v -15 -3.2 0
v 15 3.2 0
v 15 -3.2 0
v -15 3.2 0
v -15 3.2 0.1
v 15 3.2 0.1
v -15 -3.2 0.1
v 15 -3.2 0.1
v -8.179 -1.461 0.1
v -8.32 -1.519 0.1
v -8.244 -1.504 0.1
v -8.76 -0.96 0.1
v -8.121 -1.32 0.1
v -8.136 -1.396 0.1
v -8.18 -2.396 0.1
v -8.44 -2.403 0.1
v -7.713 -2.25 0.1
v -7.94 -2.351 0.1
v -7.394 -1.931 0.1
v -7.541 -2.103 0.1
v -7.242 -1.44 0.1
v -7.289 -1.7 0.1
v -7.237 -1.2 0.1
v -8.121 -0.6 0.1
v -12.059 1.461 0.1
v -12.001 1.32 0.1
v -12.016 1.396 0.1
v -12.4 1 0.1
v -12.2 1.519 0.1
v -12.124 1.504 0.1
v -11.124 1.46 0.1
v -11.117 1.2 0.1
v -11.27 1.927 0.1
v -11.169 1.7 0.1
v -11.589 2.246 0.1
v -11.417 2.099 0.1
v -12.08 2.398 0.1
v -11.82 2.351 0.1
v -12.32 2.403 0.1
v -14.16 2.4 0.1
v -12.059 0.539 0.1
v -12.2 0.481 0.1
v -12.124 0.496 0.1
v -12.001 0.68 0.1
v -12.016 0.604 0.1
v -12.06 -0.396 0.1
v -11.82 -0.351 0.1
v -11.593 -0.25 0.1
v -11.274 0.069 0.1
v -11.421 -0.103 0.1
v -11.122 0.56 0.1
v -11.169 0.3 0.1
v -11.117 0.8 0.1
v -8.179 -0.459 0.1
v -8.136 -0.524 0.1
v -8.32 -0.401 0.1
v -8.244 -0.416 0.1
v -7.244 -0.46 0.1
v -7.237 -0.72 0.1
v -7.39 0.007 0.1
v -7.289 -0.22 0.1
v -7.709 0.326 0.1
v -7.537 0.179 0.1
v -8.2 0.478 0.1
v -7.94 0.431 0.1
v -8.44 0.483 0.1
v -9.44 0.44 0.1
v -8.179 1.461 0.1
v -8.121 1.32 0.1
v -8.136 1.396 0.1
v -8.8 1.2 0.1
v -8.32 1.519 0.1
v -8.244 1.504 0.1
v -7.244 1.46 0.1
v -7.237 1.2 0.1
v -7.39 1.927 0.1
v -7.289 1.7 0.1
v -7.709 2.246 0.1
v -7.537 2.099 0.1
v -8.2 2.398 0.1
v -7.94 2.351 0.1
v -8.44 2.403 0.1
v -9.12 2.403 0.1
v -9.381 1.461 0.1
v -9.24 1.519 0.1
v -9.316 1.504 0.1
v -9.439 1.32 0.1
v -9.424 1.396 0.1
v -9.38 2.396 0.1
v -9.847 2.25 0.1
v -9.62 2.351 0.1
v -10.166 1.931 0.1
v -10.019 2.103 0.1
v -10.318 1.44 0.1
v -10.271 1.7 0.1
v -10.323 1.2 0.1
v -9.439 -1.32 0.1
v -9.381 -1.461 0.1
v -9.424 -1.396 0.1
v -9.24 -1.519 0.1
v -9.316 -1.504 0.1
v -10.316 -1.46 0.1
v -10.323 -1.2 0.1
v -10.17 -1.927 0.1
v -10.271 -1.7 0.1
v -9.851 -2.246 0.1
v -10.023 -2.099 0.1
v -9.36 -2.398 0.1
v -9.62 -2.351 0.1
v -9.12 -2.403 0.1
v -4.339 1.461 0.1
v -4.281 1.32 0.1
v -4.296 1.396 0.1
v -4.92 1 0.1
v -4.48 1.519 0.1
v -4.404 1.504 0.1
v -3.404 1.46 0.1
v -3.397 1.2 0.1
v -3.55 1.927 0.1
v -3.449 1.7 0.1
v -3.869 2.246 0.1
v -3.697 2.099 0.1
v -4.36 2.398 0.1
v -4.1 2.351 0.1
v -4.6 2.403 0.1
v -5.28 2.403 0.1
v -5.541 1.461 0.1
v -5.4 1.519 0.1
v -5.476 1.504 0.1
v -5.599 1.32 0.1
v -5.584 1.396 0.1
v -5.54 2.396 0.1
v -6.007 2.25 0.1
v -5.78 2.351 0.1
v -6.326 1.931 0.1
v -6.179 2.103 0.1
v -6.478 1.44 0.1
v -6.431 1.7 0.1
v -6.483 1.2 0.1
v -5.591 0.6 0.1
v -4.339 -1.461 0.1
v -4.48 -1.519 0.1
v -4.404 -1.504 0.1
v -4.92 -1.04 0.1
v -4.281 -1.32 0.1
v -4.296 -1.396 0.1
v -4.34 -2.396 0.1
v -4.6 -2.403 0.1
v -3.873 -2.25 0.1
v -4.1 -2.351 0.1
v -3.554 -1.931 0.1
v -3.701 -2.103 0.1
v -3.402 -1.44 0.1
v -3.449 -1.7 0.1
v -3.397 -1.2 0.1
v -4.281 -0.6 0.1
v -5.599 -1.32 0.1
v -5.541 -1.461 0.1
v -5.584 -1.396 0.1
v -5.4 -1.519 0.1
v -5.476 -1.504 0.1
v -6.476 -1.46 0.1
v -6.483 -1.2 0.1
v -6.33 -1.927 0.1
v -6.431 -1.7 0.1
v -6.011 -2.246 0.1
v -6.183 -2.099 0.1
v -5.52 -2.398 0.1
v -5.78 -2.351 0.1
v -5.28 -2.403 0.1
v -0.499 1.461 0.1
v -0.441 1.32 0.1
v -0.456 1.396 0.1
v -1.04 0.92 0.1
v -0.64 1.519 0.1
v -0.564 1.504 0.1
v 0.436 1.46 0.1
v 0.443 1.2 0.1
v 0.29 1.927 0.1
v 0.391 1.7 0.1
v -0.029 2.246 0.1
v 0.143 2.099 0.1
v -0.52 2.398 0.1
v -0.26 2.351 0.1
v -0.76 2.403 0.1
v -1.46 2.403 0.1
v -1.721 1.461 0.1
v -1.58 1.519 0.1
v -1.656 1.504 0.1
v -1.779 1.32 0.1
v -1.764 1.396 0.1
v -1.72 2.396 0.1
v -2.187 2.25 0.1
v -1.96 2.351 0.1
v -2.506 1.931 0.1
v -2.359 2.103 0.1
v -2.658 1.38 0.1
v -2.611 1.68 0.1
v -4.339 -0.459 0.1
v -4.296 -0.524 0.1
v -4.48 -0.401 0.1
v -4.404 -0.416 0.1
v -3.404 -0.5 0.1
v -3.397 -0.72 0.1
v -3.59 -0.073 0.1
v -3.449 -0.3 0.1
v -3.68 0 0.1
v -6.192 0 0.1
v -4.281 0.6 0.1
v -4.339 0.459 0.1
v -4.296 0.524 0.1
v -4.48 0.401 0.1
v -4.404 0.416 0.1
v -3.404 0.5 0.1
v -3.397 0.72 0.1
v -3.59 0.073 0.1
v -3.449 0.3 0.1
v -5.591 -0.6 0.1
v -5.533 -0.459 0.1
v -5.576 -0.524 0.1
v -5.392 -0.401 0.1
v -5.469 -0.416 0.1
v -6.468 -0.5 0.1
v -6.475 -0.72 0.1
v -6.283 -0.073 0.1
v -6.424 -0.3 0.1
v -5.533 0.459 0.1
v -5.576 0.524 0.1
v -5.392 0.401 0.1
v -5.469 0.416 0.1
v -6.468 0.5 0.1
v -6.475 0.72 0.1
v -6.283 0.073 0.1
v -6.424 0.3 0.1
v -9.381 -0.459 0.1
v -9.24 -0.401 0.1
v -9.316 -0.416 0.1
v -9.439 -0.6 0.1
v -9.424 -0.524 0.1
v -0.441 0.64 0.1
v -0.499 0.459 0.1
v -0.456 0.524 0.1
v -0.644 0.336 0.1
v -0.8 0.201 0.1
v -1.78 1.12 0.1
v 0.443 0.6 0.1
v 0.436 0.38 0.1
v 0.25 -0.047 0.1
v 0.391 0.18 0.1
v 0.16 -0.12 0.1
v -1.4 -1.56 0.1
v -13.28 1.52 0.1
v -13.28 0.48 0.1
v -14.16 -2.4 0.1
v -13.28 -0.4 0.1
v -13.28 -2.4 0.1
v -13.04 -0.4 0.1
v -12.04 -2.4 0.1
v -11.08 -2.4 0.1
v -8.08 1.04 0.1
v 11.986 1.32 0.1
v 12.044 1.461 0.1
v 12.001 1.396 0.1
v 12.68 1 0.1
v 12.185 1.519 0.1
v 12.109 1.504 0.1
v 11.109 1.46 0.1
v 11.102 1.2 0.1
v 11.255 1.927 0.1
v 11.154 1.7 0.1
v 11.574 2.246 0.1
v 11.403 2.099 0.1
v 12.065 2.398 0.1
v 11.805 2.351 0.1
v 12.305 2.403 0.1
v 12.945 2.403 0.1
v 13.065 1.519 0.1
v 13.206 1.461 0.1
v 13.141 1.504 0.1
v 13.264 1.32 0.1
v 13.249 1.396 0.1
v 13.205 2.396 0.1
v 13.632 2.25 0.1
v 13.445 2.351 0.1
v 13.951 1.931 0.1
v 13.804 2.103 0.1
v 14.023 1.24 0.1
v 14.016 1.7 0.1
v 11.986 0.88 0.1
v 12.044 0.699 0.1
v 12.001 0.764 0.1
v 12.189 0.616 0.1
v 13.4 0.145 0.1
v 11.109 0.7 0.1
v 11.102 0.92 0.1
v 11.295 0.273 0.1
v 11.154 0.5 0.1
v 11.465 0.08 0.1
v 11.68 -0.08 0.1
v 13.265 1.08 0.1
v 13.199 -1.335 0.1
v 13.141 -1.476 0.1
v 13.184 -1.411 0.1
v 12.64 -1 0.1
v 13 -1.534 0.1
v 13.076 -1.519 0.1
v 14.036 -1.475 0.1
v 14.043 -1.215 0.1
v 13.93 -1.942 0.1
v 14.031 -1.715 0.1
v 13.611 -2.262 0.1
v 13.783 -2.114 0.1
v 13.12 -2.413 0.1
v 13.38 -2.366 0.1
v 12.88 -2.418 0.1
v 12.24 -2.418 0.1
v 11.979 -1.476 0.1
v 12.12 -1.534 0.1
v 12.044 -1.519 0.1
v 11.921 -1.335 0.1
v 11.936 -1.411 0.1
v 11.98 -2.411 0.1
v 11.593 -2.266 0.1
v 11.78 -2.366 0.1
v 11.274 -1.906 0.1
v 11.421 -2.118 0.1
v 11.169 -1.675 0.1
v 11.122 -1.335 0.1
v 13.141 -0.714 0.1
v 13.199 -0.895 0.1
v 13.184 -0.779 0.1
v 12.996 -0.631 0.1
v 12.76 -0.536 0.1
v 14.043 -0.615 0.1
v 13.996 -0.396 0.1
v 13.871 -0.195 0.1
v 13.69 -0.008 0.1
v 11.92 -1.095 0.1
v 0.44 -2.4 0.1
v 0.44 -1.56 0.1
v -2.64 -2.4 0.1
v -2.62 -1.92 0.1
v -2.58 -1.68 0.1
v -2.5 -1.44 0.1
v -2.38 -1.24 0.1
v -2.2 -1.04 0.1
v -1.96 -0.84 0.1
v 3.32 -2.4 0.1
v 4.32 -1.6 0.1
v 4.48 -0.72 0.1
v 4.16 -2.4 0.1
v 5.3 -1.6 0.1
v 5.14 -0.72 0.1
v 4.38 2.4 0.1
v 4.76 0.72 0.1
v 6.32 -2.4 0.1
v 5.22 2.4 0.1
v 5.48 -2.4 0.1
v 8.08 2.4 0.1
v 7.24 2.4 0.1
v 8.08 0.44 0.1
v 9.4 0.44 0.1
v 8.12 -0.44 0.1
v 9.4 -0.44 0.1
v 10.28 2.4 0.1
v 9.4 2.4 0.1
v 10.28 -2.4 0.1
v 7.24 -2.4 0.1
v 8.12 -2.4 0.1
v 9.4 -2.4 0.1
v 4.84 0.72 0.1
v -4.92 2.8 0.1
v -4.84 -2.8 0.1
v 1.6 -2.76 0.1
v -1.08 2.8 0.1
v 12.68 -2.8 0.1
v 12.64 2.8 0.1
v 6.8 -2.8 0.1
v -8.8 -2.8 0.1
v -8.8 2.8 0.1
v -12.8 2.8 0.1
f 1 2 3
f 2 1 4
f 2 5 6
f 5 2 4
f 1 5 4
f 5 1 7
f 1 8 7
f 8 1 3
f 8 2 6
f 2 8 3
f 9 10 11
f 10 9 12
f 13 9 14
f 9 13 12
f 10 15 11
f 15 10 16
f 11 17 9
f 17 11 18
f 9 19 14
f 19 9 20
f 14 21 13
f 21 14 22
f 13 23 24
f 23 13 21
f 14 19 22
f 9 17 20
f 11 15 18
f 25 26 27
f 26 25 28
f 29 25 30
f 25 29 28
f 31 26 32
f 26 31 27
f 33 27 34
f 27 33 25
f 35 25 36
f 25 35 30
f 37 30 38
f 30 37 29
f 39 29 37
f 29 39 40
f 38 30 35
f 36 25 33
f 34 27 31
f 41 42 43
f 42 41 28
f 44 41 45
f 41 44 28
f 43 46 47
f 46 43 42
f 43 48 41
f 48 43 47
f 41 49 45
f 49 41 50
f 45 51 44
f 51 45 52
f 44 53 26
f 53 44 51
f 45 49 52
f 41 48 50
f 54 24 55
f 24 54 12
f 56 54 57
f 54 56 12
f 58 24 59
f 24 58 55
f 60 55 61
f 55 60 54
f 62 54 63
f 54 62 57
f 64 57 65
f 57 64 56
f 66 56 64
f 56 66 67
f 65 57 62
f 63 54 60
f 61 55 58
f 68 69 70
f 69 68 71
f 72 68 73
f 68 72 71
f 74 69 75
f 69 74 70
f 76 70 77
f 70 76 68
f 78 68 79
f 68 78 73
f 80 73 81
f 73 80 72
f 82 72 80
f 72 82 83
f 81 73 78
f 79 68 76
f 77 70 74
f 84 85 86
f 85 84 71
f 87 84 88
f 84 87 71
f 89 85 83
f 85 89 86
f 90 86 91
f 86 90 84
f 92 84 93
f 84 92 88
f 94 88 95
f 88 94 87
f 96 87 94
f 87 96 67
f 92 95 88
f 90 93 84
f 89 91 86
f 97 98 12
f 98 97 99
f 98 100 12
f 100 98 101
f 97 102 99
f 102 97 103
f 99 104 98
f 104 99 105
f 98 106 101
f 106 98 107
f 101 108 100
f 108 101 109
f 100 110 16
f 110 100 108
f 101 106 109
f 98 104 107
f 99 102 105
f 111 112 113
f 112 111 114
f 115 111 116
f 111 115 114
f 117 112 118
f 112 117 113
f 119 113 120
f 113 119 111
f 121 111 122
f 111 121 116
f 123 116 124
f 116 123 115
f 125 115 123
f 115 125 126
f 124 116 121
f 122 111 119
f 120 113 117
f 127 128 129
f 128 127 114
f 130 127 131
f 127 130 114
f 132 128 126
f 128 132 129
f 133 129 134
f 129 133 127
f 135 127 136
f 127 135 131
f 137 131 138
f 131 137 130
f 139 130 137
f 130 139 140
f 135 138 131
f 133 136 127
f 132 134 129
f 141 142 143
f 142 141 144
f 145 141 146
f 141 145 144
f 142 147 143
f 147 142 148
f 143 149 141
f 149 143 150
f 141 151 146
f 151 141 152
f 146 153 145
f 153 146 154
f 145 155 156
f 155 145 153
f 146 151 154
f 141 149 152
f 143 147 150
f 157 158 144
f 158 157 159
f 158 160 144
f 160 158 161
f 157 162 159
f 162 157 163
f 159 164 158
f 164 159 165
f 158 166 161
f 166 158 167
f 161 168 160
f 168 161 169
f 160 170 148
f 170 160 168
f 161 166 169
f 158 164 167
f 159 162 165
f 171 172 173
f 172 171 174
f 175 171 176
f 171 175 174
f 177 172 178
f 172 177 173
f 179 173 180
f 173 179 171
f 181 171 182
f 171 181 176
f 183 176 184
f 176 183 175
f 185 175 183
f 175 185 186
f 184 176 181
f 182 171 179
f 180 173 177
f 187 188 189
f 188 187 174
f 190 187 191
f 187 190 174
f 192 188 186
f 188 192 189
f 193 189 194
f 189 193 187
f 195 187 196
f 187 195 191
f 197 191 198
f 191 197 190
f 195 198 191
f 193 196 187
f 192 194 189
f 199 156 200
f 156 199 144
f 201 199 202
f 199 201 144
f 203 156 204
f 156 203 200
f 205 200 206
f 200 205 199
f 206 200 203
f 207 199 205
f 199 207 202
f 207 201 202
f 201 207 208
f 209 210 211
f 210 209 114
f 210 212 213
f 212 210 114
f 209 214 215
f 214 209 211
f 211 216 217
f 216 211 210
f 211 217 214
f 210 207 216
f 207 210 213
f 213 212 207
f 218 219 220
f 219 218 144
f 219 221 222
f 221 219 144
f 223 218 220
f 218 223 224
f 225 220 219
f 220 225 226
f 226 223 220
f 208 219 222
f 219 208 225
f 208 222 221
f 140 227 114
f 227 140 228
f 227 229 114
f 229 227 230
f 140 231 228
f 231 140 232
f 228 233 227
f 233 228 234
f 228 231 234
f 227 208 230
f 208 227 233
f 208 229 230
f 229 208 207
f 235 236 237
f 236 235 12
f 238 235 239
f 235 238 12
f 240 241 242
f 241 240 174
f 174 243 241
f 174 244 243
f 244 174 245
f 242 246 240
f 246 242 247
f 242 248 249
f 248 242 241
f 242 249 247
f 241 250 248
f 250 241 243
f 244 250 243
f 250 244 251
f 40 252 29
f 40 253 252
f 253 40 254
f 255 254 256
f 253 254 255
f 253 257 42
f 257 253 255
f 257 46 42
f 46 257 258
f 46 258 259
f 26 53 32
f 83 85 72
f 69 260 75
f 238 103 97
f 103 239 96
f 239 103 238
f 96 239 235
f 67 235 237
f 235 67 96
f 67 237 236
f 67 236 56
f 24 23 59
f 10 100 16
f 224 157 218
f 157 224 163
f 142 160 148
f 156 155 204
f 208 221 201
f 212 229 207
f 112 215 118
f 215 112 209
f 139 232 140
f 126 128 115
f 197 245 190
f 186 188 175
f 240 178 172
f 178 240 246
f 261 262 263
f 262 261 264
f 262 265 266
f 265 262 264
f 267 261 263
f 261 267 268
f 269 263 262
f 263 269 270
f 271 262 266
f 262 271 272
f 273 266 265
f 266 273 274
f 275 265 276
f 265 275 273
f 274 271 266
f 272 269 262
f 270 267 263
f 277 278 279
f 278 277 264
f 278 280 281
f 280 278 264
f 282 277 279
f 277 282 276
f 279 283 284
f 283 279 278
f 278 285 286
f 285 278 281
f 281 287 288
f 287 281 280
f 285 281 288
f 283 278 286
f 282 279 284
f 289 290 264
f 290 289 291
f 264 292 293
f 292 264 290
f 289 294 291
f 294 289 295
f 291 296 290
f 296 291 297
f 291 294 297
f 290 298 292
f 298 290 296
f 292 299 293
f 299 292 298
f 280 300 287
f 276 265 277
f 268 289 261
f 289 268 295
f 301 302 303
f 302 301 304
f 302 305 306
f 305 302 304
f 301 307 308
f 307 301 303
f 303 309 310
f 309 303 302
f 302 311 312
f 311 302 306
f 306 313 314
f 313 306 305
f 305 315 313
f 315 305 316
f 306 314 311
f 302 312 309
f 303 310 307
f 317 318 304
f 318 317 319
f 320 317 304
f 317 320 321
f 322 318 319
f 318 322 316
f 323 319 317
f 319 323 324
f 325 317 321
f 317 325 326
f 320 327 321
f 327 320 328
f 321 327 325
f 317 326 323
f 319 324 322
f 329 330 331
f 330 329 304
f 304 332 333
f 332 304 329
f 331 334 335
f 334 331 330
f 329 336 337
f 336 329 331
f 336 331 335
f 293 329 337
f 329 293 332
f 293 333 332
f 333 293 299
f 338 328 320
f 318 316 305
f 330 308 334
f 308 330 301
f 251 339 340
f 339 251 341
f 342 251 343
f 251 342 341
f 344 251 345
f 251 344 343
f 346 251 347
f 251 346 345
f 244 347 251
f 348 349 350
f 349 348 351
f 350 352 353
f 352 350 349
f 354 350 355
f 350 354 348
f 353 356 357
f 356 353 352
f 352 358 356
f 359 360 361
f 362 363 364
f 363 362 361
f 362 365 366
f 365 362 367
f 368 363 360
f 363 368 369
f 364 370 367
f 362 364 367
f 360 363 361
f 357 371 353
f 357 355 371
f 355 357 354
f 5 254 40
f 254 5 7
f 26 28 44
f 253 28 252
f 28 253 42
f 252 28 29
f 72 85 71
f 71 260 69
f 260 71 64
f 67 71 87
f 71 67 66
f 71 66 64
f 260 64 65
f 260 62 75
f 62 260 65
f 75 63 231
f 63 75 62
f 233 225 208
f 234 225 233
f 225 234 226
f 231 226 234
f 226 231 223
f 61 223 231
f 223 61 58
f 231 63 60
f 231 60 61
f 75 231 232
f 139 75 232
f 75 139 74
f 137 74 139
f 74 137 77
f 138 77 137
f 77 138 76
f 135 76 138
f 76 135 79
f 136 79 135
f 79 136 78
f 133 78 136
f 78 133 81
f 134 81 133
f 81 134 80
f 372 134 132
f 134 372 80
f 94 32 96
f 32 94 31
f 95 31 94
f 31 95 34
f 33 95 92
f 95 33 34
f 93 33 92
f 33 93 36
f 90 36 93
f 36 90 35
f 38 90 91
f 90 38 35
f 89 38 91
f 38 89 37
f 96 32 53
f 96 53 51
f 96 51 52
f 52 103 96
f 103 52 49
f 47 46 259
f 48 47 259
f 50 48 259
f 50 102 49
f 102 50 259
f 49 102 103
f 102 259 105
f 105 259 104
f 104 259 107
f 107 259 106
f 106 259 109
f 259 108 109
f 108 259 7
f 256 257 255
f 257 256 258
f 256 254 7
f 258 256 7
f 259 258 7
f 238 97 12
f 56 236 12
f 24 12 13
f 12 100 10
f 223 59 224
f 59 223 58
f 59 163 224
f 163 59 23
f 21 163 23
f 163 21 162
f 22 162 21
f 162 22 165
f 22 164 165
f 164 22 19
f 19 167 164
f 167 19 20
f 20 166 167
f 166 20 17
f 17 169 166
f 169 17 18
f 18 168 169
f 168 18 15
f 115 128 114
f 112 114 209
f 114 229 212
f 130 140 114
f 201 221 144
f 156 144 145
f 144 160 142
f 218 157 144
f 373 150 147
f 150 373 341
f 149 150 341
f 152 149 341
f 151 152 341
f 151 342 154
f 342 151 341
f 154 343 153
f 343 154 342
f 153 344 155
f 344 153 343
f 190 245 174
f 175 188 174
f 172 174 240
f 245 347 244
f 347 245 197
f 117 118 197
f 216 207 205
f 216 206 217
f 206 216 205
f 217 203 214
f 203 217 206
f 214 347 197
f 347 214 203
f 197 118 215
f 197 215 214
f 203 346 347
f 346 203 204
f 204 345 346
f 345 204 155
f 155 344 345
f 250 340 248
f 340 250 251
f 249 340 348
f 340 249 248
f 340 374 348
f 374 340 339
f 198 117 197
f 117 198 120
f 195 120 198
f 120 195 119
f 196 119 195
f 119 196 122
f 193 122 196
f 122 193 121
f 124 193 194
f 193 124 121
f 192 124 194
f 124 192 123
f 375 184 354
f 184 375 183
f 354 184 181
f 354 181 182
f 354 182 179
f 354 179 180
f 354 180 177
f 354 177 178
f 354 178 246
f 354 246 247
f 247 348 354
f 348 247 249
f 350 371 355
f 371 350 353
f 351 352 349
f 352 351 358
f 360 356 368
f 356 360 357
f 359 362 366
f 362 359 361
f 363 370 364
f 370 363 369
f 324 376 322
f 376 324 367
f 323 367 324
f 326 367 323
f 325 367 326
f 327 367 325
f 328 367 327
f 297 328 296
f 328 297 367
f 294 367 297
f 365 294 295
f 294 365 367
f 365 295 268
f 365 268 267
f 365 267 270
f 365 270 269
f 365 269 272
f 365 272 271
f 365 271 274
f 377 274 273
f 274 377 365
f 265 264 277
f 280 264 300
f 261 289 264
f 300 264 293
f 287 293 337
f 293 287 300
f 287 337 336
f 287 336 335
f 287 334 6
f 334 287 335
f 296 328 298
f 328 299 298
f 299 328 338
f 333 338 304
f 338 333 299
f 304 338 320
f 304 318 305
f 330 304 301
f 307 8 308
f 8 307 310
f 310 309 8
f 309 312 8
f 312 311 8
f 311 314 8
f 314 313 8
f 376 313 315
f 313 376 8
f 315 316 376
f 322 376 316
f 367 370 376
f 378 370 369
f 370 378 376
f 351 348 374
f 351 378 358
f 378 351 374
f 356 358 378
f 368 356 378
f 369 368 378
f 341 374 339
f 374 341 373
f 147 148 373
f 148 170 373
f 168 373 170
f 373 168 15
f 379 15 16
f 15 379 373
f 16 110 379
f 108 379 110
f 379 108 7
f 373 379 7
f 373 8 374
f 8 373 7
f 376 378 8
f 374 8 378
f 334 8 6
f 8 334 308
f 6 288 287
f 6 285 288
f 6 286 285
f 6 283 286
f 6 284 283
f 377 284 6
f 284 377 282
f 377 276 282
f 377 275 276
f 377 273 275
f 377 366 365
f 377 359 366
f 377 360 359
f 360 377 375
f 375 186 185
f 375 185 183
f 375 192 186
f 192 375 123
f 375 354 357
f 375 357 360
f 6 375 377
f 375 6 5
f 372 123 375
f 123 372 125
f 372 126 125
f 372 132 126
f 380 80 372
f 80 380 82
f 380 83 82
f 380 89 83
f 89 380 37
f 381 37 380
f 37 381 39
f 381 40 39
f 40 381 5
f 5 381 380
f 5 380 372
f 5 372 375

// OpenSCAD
use <../lib.scad>
use <../p/box5-12.scad>
use <s/6062886cs01.scad>
function ldraw_lib__6062886d() = [
// 0 Sticker  0.8 x  3.7 with "R682 AHS" on White Background
// 0 Name: 6062886d.dat
// 0 Author: Magnus Forsberg [MagFors]
// 0 !LDRAW_ORG Part UPDATE 2019-03
// 0 !LICENSE Licensed under CC BY 2.0 and CC BY 4.0 : see CAreadme.txt
// 
// 0 BFC CERTIFY CCW
  [0,"BFC","CERTIFY"],
  [0,"BFC","CCW"],
// 
// 0 !KEYWORDS Cooper, Mini, Mini Cooper MK VII, set 10242
// 
// 0 !HISTORY 2019-12-27 [PTadmin] Official Update 2019-03
// 
// 
// 1 16 0 -0.25 0 37.5 0 0 0 0.25 0 0 0 8 box5-12.dat
  [1,16,0,-0.25,0,37.5,0,0,0,0.25,0,0,0,8, ldraw_lib__box5_12()],
// 1 15 0 0 0 1 0 0 0 1 0 0 0 1 s\6062886cs01.dat
  [1,15,0,0,0,1,0,0,0,1,0,0,0,1, ldraw_lib__s__6062886cs01()],
];
makepoly(ldraw_lib__6062886d(), line=0.2);
